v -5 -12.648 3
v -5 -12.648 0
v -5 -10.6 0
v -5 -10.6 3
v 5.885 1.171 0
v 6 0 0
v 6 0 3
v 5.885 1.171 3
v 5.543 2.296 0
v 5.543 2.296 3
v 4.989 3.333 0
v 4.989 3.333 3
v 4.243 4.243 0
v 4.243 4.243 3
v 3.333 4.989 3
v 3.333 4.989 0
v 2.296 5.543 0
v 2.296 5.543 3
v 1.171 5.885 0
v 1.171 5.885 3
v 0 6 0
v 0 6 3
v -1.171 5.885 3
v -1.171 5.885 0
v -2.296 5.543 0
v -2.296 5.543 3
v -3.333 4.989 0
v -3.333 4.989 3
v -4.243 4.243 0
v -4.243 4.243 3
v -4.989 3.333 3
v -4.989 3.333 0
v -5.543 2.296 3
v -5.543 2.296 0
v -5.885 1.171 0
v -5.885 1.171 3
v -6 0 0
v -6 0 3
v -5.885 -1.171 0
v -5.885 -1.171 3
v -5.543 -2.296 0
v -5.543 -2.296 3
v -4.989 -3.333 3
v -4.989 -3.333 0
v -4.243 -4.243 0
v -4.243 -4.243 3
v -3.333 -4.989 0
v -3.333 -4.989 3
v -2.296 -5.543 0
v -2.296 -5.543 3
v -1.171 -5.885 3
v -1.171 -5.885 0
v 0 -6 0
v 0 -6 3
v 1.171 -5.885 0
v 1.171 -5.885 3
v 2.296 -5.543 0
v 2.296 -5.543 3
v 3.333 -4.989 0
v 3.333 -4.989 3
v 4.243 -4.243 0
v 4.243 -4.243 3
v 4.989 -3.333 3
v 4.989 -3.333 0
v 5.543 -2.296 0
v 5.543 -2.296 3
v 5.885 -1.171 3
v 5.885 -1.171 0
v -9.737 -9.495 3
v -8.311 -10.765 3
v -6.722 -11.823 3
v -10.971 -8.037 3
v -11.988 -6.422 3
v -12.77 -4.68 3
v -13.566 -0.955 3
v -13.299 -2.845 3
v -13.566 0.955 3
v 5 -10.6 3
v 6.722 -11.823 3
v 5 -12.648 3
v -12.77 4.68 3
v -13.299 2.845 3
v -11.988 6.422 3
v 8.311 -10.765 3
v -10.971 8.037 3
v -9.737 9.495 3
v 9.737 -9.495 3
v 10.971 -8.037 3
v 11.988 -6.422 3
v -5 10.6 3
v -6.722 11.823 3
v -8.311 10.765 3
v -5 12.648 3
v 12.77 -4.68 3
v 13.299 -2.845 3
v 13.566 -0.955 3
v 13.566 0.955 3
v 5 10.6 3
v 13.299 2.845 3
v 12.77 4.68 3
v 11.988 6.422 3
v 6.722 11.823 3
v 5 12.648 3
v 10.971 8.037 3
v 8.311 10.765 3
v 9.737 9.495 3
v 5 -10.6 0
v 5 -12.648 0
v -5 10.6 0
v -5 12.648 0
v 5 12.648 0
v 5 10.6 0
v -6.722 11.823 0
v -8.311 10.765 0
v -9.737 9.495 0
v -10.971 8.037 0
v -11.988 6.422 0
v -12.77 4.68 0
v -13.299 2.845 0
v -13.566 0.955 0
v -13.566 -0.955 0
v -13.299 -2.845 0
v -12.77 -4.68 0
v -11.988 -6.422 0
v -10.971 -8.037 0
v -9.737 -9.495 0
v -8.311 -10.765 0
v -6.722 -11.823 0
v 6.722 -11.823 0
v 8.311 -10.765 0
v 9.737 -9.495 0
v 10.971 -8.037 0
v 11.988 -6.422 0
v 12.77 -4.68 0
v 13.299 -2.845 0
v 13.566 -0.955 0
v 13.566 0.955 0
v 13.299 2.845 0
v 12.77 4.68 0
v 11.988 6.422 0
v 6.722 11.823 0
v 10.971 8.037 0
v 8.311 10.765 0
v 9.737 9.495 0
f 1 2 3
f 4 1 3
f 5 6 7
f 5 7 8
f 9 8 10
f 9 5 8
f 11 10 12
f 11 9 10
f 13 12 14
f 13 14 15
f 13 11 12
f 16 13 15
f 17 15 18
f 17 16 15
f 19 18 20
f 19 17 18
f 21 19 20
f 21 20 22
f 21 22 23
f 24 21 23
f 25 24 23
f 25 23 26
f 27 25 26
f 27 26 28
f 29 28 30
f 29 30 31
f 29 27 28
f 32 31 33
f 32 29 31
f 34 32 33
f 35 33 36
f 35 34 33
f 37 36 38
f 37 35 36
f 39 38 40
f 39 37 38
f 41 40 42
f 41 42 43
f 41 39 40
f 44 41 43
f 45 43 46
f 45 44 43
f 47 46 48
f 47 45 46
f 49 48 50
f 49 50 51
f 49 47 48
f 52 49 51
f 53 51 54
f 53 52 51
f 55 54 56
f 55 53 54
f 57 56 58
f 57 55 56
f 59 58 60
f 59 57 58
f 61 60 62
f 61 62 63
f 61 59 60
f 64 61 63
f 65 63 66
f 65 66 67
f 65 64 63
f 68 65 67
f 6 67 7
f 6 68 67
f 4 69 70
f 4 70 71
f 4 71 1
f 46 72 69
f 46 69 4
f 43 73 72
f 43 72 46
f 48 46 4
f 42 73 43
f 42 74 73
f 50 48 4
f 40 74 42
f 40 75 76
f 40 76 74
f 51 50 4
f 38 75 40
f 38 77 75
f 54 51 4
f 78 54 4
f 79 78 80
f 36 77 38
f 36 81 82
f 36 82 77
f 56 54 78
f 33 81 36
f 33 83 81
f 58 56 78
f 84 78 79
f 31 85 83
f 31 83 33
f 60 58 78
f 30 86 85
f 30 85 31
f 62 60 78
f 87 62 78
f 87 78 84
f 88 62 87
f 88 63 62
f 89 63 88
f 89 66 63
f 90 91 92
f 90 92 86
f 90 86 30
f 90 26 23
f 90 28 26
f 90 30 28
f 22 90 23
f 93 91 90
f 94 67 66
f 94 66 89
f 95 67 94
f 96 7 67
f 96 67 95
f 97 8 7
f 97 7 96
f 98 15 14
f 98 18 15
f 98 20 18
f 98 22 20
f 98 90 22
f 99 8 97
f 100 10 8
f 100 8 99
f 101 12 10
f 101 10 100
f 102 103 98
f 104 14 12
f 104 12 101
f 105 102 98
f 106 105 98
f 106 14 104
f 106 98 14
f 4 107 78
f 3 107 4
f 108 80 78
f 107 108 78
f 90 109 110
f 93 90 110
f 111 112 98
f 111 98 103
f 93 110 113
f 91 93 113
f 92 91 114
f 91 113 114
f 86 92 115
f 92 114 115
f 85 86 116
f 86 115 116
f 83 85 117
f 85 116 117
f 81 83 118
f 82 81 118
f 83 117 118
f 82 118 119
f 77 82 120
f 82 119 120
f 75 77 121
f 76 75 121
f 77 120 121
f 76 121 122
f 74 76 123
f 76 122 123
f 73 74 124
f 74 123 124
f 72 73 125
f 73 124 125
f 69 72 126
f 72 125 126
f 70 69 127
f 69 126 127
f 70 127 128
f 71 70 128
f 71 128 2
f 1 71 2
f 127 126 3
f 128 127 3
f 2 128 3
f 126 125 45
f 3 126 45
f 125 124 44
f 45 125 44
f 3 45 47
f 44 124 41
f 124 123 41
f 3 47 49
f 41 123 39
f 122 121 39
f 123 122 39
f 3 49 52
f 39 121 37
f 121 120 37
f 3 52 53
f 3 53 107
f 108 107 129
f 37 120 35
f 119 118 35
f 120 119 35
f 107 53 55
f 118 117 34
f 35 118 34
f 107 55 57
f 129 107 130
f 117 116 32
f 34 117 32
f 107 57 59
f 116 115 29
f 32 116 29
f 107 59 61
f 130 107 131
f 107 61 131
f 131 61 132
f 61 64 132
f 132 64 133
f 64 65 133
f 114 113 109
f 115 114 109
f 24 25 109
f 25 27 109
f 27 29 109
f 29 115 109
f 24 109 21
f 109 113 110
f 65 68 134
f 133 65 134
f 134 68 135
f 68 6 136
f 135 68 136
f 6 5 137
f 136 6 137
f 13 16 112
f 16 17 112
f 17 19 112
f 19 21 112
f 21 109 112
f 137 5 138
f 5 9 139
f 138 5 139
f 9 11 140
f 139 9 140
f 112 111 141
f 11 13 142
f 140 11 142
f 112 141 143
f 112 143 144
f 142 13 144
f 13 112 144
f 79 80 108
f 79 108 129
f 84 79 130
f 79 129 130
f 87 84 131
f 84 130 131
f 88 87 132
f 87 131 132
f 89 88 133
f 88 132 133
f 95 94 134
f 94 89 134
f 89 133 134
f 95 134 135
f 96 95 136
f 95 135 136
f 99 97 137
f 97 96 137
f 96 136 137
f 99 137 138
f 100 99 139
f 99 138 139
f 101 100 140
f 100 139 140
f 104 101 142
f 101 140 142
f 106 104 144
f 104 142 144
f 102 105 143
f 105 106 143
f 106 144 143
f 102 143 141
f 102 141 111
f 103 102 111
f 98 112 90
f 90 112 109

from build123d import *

# Parameters (mm, degrees)
SKETCH_1_R          = 13.6
SKETCH_1_R_2        = 6
EXTRUDE_1_DEPTH     = 3
SKETCH_2_W          = 10
SKETCH_2_H          = 6
CUT_EXTRUDE_1_DEPTH = 3


with BuildPart() as part:
    # 스케치1 → 보스-돌출1 (new body)
    with BuildSketch(Plane.XY):
        Circle(SKETCH_1_R)
        Circle(SKETCH_1_R_2, mode=Mode.SUBTRACT)
    extrude(amount=EXTRUDE_1_DEPTH)

    # 스케치2 → 컷-돌출1 (cut)
    with BuildSketch(Plane(origin=(0, 0, 0), x_dir=(-1, 0, 0), z_dir=(0, 0, -1))):
        with Locations((0, -13.6)):
            Rectangle(SKETCH_2_W, SKETCH_2_H)
        with Locations((0, 13.6)):
            Rectangle(SKETCH_2_W, SKETCH_2_H)
    extrude(amount=-CUT_EXTRUDE_1_DEPTH, mode=Mode.SUBTRACT)


solid = part.part
